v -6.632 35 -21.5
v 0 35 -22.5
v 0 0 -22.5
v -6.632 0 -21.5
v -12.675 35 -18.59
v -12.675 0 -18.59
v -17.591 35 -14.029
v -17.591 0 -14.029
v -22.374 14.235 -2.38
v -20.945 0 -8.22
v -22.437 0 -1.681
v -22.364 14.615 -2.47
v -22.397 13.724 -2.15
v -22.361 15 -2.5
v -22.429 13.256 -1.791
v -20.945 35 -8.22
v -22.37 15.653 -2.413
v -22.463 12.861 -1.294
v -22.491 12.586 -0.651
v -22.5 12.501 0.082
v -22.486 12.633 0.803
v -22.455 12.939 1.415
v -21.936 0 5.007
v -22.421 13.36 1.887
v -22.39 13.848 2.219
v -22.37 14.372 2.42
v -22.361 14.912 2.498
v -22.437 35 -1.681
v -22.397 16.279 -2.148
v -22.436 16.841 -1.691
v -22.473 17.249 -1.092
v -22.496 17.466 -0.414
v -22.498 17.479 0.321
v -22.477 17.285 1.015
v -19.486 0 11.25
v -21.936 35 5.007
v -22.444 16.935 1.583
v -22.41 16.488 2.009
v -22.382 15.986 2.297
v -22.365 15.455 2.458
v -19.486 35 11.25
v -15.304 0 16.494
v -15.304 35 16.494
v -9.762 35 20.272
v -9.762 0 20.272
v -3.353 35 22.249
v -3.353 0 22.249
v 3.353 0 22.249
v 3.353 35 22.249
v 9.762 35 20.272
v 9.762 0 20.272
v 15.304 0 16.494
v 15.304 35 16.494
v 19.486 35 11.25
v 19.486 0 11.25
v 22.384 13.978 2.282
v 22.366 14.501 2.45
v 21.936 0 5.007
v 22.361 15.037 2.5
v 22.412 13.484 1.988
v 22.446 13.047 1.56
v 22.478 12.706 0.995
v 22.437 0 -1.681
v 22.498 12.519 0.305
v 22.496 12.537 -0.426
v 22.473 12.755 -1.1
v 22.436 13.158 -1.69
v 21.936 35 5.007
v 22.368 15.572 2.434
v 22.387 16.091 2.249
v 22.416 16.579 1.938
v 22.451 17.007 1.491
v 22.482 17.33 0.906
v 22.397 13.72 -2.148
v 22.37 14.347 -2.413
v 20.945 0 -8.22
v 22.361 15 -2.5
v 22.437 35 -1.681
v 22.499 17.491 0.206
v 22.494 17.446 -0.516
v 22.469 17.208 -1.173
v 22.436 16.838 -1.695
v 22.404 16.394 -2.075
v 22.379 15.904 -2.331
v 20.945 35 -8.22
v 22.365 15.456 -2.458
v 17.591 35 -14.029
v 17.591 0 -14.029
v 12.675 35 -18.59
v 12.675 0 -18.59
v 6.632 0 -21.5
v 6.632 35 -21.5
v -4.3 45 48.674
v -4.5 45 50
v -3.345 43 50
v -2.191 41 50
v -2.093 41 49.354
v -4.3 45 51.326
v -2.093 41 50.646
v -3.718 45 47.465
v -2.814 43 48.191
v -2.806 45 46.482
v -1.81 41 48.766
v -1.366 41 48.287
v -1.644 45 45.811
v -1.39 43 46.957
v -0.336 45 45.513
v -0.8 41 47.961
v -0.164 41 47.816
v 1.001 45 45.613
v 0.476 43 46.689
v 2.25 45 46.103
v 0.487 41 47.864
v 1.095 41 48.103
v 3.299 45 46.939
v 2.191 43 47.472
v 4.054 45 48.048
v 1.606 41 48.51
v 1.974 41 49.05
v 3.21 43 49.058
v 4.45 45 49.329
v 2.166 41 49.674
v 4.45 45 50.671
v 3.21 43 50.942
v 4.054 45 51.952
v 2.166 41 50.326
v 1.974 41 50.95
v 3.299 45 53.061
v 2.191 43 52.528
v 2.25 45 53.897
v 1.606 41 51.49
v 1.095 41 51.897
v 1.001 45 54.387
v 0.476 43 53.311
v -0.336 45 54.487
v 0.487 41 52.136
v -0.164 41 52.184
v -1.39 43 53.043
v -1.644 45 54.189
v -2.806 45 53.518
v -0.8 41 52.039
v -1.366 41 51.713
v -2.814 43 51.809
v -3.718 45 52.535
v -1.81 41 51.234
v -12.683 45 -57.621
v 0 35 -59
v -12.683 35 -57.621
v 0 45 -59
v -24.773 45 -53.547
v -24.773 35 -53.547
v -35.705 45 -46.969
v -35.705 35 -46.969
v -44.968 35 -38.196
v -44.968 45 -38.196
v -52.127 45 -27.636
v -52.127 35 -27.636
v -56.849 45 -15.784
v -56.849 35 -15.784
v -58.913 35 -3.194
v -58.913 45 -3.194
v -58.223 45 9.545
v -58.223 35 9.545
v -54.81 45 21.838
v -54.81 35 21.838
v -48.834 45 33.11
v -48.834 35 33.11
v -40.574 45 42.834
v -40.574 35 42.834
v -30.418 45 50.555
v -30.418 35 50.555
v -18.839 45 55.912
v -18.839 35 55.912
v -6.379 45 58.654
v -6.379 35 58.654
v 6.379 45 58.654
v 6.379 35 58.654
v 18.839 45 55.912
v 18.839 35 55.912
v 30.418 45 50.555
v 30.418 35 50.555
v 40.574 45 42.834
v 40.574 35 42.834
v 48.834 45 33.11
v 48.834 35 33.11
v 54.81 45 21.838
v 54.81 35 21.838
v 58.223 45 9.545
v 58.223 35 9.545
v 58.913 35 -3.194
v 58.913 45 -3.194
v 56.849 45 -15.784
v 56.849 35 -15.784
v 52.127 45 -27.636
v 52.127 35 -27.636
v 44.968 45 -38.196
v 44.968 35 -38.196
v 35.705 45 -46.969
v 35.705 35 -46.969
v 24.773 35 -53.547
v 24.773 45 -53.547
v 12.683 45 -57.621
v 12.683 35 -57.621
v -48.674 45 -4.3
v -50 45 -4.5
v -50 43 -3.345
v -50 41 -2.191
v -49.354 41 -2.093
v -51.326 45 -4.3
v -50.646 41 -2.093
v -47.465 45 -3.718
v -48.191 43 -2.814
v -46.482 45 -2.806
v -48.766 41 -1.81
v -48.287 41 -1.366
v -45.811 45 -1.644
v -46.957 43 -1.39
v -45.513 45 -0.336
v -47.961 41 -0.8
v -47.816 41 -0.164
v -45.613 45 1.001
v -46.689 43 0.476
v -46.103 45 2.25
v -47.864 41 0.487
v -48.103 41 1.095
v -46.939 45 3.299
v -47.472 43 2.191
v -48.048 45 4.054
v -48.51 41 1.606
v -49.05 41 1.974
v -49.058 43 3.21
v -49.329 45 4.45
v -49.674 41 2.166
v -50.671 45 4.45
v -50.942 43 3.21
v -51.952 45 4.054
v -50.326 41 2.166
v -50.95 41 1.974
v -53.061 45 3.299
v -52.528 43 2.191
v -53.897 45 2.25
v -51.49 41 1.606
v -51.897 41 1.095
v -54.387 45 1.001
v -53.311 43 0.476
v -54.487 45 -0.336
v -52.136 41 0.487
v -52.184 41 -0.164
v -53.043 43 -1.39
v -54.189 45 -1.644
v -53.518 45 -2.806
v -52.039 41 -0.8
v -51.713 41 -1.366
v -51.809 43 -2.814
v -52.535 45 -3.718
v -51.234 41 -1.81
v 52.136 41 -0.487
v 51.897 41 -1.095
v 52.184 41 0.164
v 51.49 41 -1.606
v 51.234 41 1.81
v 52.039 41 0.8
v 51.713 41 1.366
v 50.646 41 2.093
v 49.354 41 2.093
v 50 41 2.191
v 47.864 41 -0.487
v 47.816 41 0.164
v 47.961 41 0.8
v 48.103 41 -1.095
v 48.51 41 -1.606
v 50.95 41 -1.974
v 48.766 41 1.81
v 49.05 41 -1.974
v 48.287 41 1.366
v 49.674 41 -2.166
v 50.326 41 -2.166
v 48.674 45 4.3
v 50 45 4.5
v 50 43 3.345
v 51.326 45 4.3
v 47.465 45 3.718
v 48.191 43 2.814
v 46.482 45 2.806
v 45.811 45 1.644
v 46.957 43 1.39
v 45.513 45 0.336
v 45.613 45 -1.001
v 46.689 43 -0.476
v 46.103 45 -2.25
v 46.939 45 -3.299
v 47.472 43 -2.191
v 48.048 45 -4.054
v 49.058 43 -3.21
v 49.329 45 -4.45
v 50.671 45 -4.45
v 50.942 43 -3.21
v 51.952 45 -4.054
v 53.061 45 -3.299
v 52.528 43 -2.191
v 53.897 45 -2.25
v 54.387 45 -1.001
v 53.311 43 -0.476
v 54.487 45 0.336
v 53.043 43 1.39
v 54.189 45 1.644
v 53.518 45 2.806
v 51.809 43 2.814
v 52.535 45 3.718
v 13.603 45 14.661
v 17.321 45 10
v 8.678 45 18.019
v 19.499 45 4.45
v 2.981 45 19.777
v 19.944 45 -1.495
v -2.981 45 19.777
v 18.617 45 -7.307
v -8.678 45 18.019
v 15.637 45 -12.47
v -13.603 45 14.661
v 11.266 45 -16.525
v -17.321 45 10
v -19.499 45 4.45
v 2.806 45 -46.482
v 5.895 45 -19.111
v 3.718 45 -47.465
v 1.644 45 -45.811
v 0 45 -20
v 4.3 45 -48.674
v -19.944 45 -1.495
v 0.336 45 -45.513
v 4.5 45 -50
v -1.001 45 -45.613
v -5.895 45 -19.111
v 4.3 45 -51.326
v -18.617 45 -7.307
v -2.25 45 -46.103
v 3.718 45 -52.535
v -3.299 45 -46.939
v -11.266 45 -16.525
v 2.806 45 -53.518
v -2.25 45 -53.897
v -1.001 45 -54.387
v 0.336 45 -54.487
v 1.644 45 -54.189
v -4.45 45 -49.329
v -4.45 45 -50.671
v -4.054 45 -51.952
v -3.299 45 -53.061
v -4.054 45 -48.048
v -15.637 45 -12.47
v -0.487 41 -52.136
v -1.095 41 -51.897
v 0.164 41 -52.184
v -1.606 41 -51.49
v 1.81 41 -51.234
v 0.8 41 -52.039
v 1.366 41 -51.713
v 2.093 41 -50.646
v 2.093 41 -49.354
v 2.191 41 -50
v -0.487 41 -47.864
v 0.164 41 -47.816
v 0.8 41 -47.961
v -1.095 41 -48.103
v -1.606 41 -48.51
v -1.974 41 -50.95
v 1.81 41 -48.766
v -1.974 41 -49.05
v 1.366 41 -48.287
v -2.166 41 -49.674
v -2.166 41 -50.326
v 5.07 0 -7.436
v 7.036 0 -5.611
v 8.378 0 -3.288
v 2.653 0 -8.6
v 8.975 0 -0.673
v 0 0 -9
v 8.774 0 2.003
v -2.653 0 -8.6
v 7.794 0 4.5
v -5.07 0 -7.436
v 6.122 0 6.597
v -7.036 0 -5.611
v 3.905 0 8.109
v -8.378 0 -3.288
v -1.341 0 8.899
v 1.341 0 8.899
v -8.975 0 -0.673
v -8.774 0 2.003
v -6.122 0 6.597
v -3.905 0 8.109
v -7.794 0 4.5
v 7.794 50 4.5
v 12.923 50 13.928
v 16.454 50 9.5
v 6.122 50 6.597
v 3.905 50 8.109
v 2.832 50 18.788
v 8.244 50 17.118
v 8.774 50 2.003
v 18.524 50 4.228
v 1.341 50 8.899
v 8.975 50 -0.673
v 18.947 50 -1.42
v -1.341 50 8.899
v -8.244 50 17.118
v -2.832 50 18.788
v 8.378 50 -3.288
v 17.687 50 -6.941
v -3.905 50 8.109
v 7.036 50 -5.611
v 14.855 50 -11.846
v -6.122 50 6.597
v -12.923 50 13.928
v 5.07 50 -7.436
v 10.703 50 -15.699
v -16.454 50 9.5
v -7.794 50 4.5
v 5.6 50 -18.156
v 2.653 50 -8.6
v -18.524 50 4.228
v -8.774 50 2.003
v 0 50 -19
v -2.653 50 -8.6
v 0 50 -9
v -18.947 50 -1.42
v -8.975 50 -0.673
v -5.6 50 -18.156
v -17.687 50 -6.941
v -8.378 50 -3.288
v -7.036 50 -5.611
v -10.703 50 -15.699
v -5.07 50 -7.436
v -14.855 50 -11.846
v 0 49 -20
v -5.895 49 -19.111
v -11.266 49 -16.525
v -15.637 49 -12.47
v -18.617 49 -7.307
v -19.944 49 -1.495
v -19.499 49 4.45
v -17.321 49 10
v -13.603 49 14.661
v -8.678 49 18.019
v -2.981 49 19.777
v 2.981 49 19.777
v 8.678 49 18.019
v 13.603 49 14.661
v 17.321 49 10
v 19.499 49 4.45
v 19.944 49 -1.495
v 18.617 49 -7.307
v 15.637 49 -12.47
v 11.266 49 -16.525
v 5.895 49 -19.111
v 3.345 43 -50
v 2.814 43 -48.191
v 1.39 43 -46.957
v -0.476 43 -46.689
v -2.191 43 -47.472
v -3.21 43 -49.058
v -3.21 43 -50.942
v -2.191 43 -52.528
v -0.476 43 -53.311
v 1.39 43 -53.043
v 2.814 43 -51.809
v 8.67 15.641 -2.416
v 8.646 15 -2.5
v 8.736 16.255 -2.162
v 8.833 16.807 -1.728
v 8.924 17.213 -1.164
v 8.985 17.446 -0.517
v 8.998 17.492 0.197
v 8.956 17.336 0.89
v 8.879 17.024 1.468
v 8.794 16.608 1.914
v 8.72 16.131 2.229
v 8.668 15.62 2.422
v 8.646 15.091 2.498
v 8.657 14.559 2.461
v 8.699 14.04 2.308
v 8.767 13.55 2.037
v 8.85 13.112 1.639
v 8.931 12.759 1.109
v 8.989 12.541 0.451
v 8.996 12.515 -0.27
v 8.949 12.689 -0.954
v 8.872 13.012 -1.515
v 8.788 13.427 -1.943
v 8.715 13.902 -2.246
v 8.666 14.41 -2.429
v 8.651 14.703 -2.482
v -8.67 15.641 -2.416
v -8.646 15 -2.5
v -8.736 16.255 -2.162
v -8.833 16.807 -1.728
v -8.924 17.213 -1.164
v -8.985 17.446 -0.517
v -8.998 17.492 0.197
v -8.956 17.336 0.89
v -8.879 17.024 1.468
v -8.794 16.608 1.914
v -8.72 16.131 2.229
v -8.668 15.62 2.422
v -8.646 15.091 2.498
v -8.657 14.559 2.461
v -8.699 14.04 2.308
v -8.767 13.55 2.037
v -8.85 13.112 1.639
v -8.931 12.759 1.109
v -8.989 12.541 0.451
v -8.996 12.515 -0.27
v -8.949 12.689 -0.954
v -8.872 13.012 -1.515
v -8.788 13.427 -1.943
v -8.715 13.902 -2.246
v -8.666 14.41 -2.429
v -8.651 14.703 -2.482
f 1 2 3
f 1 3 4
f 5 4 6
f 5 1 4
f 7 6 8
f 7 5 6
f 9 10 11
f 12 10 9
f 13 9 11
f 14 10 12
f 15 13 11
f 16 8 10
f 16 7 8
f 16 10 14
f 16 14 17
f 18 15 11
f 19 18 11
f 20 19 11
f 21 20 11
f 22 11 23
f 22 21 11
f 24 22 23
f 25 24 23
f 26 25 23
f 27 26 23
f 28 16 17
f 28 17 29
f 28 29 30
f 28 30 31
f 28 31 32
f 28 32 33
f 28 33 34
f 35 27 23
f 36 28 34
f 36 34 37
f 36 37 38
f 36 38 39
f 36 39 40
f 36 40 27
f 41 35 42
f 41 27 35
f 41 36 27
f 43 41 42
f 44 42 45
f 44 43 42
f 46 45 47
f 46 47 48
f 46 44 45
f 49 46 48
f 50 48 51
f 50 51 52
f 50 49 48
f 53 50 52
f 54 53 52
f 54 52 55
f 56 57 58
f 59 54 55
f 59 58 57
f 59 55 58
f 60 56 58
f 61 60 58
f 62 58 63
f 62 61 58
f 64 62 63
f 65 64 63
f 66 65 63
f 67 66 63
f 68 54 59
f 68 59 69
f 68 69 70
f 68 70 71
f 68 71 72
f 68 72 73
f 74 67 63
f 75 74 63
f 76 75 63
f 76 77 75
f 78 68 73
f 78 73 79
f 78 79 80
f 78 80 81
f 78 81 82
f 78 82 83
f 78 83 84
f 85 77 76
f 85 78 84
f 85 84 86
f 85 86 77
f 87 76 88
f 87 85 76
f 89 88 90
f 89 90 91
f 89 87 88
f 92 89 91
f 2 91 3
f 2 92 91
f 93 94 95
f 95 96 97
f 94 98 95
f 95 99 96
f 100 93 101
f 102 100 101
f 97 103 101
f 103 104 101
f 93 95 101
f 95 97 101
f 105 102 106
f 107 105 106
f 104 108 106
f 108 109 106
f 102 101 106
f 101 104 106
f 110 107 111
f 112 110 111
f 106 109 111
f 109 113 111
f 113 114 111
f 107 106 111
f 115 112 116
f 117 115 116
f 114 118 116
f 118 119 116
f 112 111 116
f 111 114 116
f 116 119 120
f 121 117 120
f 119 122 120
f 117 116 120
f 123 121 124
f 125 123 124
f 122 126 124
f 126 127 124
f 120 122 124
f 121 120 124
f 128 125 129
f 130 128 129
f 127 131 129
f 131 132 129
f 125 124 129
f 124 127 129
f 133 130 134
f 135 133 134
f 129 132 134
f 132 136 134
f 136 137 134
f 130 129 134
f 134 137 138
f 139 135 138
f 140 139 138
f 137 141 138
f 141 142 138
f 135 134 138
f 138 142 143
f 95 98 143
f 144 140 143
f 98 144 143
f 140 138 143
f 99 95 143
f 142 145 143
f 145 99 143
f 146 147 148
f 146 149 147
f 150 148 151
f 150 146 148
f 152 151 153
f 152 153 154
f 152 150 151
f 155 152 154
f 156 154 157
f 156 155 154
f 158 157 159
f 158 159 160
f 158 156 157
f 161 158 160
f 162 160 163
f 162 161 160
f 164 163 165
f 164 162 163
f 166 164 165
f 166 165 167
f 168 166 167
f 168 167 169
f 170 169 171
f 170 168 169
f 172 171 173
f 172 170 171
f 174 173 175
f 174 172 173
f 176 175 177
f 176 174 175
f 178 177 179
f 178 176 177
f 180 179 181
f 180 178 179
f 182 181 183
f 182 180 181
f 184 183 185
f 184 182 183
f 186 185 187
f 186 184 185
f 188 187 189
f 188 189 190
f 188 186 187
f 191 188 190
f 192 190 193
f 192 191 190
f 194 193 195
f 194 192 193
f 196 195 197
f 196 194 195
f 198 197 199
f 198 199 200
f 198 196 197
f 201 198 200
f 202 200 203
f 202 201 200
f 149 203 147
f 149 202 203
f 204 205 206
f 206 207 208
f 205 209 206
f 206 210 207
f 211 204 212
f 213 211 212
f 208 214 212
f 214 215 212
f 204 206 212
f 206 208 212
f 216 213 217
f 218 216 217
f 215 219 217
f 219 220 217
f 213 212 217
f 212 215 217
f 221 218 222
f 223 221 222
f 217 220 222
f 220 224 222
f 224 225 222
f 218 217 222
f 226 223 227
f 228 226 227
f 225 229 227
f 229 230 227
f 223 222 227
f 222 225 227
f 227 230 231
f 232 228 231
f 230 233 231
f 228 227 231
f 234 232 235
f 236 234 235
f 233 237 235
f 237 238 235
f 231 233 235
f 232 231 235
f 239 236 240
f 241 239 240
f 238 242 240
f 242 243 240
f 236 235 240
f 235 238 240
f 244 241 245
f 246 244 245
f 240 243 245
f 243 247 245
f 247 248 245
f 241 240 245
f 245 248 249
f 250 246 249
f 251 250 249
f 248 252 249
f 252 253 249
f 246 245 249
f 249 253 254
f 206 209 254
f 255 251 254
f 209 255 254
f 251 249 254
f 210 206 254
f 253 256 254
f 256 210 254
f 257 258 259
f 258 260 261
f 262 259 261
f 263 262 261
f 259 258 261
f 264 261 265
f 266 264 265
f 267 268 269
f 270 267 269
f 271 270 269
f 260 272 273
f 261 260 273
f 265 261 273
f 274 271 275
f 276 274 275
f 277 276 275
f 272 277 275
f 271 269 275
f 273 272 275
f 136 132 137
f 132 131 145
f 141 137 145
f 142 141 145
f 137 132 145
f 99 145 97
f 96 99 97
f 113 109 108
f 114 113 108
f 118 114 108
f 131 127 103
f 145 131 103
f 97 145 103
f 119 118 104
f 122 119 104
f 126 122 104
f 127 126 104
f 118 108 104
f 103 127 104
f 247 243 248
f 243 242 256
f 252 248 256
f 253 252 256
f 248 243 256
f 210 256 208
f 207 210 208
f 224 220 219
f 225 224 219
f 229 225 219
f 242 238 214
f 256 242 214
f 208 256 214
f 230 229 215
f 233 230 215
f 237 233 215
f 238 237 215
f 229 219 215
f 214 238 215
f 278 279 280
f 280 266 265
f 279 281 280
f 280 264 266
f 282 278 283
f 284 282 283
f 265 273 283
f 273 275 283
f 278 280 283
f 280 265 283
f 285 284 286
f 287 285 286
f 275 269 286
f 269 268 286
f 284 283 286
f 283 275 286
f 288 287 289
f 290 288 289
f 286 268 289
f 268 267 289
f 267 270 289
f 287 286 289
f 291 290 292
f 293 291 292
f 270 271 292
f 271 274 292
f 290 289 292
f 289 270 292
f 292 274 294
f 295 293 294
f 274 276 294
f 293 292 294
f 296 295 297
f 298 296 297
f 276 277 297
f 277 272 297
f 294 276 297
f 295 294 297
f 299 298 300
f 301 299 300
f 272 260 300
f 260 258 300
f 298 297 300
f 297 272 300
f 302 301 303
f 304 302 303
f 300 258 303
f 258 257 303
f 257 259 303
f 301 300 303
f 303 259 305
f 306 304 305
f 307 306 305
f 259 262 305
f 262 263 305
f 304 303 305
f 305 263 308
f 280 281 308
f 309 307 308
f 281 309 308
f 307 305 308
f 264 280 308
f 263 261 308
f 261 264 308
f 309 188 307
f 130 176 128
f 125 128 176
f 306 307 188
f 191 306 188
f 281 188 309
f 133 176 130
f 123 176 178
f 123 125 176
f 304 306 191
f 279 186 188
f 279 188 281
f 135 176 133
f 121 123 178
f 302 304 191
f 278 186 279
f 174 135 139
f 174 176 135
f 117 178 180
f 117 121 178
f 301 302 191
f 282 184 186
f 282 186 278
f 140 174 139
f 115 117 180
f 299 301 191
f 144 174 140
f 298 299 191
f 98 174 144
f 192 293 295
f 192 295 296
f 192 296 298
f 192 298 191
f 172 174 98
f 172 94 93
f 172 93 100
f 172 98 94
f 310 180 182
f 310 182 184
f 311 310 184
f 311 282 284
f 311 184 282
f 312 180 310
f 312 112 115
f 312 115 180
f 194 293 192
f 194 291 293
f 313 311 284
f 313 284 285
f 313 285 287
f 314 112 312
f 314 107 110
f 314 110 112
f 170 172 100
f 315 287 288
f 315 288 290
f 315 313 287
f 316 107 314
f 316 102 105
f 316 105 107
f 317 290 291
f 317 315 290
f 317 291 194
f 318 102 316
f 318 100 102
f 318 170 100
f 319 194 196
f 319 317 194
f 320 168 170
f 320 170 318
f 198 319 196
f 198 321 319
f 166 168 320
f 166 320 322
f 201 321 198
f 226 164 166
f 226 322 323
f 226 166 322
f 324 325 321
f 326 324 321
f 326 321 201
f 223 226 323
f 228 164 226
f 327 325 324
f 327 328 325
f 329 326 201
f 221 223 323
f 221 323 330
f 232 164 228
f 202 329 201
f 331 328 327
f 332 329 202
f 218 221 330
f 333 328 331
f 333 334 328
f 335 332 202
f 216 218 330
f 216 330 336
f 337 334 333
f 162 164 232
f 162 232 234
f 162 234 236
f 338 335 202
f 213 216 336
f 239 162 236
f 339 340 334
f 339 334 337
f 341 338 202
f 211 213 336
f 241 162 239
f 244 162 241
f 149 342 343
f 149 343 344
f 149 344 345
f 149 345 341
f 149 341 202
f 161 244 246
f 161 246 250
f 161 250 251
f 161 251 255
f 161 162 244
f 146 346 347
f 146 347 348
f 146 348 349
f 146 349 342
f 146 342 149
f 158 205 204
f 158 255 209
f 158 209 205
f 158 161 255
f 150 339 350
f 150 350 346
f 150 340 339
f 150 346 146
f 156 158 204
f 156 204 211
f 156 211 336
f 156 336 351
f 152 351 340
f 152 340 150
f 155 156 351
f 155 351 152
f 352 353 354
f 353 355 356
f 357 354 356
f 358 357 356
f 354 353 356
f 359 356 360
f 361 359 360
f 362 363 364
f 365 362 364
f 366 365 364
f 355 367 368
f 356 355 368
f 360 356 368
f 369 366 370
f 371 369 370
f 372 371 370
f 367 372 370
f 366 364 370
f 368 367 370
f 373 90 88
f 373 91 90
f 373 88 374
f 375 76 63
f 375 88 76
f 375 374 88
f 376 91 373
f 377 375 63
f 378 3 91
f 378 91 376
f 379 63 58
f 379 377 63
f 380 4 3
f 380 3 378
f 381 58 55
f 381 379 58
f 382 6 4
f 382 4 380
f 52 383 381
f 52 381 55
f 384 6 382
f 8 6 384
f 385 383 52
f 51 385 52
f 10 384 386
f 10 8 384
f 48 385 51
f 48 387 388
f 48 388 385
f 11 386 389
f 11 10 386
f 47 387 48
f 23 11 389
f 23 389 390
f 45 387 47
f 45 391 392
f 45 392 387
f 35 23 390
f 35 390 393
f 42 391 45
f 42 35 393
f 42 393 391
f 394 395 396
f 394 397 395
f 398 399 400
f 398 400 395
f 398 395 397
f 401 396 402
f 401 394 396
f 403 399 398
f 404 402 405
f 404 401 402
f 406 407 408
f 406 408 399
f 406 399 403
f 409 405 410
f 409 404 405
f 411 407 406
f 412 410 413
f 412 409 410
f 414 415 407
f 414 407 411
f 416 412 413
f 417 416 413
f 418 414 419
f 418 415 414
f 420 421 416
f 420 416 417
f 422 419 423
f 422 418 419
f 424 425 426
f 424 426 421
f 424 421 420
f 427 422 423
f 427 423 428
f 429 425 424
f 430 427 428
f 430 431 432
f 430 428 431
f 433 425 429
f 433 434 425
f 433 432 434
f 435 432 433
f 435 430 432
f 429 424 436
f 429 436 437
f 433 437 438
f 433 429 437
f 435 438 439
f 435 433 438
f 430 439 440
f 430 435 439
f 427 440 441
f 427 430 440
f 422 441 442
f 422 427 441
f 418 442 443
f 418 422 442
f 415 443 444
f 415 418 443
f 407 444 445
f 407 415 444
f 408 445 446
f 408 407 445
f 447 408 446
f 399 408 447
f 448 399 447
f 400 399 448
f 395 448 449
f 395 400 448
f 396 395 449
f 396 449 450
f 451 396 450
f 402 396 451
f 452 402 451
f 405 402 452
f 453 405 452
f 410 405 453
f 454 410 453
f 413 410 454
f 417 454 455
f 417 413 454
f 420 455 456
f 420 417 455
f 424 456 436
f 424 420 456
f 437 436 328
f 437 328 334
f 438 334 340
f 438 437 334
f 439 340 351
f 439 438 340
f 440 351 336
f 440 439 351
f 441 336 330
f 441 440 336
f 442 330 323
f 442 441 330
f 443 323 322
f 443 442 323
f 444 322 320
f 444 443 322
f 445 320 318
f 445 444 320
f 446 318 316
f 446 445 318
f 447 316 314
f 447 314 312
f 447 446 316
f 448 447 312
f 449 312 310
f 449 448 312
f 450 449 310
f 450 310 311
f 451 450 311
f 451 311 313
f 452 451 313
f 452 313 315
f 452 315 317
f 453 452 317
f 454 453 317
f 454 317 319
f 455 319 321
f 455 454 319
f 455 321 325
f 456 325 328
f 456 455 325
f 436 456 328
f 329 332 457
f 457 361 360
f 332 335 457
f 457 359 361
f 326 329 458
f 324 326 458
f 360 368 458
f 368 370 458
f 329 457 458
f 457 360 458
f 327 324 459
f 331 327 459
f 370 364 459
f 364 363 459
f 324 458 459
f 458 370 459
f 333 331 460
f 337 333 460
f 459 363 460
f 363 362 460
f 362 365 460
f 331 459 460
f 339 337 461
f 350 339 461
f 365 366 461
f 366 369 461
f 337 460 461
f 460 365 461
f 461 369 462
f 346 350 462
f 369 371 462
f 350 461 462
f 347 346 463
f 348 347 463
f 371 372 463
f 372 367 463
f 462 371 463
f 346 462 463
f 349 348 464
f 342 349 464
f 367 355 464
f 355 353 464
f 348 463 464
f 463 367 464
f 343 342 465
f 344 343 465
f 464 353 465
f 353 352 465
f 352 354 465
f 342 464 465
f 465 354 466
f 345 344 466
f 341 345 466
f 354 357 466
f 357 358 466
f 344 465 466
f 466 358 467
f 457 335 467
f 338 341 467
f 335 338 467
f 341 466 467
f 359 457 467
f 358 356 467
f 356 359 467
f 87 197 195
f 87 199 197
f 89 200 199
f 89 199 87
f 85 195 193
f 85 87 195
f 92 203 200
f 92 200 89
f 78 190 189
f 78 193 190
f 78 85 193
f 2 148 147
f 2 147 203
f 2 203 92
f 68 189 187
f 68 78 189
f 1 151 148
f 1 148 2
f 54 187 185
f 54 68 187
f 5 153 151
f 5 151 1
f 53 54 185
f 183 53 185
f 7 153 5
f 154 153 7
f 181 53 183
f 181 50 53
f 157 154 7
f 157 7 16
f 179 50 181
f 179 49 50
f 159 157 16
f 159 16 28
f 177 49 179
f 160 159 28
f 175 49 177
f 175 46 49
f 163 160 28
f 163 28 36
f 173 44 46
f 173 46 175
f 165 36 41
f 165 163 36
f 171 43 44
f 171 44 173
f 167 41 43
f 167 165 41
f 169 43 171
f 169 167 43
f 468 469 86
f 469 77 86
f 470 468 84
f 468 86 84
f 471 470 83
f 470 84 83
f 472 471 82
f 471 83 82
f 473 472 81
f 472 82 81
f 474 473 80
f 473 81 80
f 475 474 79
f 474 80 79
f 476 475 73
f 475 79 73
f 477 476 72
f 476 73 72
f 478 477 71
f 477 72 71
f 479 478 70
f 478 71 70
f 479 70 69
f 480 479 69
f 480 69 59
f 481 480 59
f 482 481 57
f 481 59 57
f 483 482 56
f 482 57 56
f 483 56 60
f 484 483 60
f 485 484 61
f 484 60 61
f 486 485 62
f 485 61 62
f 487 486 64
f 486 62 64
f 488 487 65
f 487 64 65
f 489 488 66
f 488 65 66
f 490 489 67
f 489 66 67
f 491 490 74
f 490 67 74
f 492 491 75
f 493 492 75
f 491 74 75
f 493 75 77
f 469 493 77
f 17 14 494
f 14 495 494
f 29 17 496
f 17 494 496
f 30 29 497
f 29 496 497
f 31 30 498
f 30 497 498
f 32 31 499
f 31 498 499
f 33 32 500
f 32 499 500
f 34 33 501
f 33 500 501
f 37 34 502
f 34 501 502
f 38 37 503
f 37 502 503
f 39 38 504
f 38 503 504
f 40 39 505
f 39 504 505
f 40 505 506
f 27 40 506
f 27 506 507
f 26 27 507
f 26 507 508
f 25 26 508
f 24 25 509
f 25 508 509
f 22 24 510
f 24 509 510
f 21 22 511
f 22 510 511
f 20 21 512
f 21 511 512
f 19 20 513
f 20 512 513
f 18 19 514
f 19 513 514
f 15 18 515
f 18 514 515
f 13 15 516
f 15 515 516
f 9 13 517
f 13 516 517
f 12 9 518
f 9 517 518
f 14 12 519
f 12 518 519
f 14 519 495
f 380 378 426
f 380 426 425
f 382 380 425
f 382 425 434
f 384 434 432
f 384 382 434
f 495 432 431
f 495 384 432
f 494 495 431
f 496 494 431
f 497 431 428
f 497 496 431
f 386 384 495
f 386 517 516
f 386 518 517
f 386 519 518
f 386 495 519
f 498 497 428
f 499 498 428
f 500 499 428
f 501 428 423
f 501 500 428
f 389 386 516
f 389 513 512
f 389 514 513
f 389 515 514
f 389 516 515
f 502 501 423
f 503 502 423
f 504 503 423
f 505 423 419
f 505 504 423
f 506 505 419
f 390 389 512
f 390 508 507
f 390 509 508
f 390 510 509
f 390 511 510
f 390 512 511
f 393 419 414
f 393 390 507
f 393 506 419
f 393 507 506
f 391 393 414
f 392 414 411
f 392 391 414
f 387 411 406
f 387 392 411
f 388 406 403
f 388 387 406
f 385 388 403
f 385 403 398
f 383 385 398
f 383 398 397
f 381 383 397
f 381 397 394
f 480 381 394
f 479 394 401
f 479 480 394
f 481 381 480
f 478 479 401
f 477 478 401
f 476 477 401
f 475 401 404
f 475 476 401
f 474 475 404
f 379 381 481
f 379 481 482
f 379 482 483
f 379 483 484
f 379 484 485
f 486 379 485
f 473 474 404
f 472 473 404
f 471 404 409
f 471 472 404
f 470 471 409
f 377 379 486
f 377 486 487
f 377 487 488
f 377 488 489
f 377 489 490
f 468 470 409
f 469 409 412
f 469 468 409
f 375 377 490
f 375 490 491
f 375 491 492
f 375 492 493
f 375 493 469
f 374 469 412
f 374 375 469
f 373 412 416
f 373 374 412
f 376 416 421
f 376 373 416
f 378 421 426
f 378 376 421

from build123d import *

# Parameters (mm, degrees)
R_P_TITION_CIRCULAIRE1_COUNT = 4
ESQUISSE3_R                  = 2.5
ENL_V_MAT_EXTRU_1_DEPTH      = 22.5
CHANFREIN1_SIZE              = 1


with BuildPart() as part:
    # Esquisse1 → Base-Révolution (revolve)
    with BuildSketch(Plane.XY, mode=Mode.PRIVATE) as base_r_volution_sk:
        Polygon((9, 0), (22.5, 0), (22.5, 35), (59, 35), (59, 45), (20, 45), (20, 50), (9, 50), align=None)
    revolve(base_r_volution_sk.sketch.rotate(Axis((0, 0, 0), (0, 1, 0)), 90), axis=Axis((0, 0, 0), (0, 1, 0)))

    # Esquisse2 → Enlever de la matière-Révolution1 (revolve, cut)
    with BuildSketch(Plane.XY, mode=Mode.PRIVATE) as enlever_de_la_mati_re_r_volution1_sk:
        Polygon((50, 45), (45.5, 45), (47.809401077, 41), (50, 41), align=None)
    enlever_de_la_mati_re_r_volution1 = revolve(enlever_de_la_mati_re_r_volution1_sk.sketch.rotate(Axis((50, 50.797703058, 0), (0, -1, 0)), 270), axis=Axis((50, 50.797703058, 0), (0, -1, 0)), mode=Mode.SUBTRACT)

    # Répétition circulaire1: Enlever de la matière-Révolution1 ×4 about axis
    r_p_tition_circulaire1_axis = Axis((0, 0, 0), (0, 1, 0))
    for i in range(1, R_P_TITION_CIRCULAIRE1_COUNT):
        add(enlever_de_la_mati_re_r_volution1.rotate(r_p_tition_circulaire1_axis, i * 360 / R_P_TITION_CIRCULAIRE1_COUNT), mode=Mode.SUBTRACT)

    # Esquisse3 → Enlèv. mat.-Extru.1 (cut, symmetric)
    with BuildSketch(Plane(origin=(0, 0, 0), x_dir=(0, 0, -1), z_dir=(1, 0, 0))):
        with Locations((0, 15)):
            Circle(ESQUISSE3_R)
    extrude(amount=ENL_V_MAT_EXTRU_1_DEPTH, both=True, mode=Mode.SUBTRACT)

    # Chanfrein1
    chanfrein1_edges = [part.edges().sort_by_distance(p)[0] for p in [
        (0, 50, 20),
    ]]
    chamfer(chanfrein1_edges, length=CHANFREIN1_SIZE)


solid = part.part
